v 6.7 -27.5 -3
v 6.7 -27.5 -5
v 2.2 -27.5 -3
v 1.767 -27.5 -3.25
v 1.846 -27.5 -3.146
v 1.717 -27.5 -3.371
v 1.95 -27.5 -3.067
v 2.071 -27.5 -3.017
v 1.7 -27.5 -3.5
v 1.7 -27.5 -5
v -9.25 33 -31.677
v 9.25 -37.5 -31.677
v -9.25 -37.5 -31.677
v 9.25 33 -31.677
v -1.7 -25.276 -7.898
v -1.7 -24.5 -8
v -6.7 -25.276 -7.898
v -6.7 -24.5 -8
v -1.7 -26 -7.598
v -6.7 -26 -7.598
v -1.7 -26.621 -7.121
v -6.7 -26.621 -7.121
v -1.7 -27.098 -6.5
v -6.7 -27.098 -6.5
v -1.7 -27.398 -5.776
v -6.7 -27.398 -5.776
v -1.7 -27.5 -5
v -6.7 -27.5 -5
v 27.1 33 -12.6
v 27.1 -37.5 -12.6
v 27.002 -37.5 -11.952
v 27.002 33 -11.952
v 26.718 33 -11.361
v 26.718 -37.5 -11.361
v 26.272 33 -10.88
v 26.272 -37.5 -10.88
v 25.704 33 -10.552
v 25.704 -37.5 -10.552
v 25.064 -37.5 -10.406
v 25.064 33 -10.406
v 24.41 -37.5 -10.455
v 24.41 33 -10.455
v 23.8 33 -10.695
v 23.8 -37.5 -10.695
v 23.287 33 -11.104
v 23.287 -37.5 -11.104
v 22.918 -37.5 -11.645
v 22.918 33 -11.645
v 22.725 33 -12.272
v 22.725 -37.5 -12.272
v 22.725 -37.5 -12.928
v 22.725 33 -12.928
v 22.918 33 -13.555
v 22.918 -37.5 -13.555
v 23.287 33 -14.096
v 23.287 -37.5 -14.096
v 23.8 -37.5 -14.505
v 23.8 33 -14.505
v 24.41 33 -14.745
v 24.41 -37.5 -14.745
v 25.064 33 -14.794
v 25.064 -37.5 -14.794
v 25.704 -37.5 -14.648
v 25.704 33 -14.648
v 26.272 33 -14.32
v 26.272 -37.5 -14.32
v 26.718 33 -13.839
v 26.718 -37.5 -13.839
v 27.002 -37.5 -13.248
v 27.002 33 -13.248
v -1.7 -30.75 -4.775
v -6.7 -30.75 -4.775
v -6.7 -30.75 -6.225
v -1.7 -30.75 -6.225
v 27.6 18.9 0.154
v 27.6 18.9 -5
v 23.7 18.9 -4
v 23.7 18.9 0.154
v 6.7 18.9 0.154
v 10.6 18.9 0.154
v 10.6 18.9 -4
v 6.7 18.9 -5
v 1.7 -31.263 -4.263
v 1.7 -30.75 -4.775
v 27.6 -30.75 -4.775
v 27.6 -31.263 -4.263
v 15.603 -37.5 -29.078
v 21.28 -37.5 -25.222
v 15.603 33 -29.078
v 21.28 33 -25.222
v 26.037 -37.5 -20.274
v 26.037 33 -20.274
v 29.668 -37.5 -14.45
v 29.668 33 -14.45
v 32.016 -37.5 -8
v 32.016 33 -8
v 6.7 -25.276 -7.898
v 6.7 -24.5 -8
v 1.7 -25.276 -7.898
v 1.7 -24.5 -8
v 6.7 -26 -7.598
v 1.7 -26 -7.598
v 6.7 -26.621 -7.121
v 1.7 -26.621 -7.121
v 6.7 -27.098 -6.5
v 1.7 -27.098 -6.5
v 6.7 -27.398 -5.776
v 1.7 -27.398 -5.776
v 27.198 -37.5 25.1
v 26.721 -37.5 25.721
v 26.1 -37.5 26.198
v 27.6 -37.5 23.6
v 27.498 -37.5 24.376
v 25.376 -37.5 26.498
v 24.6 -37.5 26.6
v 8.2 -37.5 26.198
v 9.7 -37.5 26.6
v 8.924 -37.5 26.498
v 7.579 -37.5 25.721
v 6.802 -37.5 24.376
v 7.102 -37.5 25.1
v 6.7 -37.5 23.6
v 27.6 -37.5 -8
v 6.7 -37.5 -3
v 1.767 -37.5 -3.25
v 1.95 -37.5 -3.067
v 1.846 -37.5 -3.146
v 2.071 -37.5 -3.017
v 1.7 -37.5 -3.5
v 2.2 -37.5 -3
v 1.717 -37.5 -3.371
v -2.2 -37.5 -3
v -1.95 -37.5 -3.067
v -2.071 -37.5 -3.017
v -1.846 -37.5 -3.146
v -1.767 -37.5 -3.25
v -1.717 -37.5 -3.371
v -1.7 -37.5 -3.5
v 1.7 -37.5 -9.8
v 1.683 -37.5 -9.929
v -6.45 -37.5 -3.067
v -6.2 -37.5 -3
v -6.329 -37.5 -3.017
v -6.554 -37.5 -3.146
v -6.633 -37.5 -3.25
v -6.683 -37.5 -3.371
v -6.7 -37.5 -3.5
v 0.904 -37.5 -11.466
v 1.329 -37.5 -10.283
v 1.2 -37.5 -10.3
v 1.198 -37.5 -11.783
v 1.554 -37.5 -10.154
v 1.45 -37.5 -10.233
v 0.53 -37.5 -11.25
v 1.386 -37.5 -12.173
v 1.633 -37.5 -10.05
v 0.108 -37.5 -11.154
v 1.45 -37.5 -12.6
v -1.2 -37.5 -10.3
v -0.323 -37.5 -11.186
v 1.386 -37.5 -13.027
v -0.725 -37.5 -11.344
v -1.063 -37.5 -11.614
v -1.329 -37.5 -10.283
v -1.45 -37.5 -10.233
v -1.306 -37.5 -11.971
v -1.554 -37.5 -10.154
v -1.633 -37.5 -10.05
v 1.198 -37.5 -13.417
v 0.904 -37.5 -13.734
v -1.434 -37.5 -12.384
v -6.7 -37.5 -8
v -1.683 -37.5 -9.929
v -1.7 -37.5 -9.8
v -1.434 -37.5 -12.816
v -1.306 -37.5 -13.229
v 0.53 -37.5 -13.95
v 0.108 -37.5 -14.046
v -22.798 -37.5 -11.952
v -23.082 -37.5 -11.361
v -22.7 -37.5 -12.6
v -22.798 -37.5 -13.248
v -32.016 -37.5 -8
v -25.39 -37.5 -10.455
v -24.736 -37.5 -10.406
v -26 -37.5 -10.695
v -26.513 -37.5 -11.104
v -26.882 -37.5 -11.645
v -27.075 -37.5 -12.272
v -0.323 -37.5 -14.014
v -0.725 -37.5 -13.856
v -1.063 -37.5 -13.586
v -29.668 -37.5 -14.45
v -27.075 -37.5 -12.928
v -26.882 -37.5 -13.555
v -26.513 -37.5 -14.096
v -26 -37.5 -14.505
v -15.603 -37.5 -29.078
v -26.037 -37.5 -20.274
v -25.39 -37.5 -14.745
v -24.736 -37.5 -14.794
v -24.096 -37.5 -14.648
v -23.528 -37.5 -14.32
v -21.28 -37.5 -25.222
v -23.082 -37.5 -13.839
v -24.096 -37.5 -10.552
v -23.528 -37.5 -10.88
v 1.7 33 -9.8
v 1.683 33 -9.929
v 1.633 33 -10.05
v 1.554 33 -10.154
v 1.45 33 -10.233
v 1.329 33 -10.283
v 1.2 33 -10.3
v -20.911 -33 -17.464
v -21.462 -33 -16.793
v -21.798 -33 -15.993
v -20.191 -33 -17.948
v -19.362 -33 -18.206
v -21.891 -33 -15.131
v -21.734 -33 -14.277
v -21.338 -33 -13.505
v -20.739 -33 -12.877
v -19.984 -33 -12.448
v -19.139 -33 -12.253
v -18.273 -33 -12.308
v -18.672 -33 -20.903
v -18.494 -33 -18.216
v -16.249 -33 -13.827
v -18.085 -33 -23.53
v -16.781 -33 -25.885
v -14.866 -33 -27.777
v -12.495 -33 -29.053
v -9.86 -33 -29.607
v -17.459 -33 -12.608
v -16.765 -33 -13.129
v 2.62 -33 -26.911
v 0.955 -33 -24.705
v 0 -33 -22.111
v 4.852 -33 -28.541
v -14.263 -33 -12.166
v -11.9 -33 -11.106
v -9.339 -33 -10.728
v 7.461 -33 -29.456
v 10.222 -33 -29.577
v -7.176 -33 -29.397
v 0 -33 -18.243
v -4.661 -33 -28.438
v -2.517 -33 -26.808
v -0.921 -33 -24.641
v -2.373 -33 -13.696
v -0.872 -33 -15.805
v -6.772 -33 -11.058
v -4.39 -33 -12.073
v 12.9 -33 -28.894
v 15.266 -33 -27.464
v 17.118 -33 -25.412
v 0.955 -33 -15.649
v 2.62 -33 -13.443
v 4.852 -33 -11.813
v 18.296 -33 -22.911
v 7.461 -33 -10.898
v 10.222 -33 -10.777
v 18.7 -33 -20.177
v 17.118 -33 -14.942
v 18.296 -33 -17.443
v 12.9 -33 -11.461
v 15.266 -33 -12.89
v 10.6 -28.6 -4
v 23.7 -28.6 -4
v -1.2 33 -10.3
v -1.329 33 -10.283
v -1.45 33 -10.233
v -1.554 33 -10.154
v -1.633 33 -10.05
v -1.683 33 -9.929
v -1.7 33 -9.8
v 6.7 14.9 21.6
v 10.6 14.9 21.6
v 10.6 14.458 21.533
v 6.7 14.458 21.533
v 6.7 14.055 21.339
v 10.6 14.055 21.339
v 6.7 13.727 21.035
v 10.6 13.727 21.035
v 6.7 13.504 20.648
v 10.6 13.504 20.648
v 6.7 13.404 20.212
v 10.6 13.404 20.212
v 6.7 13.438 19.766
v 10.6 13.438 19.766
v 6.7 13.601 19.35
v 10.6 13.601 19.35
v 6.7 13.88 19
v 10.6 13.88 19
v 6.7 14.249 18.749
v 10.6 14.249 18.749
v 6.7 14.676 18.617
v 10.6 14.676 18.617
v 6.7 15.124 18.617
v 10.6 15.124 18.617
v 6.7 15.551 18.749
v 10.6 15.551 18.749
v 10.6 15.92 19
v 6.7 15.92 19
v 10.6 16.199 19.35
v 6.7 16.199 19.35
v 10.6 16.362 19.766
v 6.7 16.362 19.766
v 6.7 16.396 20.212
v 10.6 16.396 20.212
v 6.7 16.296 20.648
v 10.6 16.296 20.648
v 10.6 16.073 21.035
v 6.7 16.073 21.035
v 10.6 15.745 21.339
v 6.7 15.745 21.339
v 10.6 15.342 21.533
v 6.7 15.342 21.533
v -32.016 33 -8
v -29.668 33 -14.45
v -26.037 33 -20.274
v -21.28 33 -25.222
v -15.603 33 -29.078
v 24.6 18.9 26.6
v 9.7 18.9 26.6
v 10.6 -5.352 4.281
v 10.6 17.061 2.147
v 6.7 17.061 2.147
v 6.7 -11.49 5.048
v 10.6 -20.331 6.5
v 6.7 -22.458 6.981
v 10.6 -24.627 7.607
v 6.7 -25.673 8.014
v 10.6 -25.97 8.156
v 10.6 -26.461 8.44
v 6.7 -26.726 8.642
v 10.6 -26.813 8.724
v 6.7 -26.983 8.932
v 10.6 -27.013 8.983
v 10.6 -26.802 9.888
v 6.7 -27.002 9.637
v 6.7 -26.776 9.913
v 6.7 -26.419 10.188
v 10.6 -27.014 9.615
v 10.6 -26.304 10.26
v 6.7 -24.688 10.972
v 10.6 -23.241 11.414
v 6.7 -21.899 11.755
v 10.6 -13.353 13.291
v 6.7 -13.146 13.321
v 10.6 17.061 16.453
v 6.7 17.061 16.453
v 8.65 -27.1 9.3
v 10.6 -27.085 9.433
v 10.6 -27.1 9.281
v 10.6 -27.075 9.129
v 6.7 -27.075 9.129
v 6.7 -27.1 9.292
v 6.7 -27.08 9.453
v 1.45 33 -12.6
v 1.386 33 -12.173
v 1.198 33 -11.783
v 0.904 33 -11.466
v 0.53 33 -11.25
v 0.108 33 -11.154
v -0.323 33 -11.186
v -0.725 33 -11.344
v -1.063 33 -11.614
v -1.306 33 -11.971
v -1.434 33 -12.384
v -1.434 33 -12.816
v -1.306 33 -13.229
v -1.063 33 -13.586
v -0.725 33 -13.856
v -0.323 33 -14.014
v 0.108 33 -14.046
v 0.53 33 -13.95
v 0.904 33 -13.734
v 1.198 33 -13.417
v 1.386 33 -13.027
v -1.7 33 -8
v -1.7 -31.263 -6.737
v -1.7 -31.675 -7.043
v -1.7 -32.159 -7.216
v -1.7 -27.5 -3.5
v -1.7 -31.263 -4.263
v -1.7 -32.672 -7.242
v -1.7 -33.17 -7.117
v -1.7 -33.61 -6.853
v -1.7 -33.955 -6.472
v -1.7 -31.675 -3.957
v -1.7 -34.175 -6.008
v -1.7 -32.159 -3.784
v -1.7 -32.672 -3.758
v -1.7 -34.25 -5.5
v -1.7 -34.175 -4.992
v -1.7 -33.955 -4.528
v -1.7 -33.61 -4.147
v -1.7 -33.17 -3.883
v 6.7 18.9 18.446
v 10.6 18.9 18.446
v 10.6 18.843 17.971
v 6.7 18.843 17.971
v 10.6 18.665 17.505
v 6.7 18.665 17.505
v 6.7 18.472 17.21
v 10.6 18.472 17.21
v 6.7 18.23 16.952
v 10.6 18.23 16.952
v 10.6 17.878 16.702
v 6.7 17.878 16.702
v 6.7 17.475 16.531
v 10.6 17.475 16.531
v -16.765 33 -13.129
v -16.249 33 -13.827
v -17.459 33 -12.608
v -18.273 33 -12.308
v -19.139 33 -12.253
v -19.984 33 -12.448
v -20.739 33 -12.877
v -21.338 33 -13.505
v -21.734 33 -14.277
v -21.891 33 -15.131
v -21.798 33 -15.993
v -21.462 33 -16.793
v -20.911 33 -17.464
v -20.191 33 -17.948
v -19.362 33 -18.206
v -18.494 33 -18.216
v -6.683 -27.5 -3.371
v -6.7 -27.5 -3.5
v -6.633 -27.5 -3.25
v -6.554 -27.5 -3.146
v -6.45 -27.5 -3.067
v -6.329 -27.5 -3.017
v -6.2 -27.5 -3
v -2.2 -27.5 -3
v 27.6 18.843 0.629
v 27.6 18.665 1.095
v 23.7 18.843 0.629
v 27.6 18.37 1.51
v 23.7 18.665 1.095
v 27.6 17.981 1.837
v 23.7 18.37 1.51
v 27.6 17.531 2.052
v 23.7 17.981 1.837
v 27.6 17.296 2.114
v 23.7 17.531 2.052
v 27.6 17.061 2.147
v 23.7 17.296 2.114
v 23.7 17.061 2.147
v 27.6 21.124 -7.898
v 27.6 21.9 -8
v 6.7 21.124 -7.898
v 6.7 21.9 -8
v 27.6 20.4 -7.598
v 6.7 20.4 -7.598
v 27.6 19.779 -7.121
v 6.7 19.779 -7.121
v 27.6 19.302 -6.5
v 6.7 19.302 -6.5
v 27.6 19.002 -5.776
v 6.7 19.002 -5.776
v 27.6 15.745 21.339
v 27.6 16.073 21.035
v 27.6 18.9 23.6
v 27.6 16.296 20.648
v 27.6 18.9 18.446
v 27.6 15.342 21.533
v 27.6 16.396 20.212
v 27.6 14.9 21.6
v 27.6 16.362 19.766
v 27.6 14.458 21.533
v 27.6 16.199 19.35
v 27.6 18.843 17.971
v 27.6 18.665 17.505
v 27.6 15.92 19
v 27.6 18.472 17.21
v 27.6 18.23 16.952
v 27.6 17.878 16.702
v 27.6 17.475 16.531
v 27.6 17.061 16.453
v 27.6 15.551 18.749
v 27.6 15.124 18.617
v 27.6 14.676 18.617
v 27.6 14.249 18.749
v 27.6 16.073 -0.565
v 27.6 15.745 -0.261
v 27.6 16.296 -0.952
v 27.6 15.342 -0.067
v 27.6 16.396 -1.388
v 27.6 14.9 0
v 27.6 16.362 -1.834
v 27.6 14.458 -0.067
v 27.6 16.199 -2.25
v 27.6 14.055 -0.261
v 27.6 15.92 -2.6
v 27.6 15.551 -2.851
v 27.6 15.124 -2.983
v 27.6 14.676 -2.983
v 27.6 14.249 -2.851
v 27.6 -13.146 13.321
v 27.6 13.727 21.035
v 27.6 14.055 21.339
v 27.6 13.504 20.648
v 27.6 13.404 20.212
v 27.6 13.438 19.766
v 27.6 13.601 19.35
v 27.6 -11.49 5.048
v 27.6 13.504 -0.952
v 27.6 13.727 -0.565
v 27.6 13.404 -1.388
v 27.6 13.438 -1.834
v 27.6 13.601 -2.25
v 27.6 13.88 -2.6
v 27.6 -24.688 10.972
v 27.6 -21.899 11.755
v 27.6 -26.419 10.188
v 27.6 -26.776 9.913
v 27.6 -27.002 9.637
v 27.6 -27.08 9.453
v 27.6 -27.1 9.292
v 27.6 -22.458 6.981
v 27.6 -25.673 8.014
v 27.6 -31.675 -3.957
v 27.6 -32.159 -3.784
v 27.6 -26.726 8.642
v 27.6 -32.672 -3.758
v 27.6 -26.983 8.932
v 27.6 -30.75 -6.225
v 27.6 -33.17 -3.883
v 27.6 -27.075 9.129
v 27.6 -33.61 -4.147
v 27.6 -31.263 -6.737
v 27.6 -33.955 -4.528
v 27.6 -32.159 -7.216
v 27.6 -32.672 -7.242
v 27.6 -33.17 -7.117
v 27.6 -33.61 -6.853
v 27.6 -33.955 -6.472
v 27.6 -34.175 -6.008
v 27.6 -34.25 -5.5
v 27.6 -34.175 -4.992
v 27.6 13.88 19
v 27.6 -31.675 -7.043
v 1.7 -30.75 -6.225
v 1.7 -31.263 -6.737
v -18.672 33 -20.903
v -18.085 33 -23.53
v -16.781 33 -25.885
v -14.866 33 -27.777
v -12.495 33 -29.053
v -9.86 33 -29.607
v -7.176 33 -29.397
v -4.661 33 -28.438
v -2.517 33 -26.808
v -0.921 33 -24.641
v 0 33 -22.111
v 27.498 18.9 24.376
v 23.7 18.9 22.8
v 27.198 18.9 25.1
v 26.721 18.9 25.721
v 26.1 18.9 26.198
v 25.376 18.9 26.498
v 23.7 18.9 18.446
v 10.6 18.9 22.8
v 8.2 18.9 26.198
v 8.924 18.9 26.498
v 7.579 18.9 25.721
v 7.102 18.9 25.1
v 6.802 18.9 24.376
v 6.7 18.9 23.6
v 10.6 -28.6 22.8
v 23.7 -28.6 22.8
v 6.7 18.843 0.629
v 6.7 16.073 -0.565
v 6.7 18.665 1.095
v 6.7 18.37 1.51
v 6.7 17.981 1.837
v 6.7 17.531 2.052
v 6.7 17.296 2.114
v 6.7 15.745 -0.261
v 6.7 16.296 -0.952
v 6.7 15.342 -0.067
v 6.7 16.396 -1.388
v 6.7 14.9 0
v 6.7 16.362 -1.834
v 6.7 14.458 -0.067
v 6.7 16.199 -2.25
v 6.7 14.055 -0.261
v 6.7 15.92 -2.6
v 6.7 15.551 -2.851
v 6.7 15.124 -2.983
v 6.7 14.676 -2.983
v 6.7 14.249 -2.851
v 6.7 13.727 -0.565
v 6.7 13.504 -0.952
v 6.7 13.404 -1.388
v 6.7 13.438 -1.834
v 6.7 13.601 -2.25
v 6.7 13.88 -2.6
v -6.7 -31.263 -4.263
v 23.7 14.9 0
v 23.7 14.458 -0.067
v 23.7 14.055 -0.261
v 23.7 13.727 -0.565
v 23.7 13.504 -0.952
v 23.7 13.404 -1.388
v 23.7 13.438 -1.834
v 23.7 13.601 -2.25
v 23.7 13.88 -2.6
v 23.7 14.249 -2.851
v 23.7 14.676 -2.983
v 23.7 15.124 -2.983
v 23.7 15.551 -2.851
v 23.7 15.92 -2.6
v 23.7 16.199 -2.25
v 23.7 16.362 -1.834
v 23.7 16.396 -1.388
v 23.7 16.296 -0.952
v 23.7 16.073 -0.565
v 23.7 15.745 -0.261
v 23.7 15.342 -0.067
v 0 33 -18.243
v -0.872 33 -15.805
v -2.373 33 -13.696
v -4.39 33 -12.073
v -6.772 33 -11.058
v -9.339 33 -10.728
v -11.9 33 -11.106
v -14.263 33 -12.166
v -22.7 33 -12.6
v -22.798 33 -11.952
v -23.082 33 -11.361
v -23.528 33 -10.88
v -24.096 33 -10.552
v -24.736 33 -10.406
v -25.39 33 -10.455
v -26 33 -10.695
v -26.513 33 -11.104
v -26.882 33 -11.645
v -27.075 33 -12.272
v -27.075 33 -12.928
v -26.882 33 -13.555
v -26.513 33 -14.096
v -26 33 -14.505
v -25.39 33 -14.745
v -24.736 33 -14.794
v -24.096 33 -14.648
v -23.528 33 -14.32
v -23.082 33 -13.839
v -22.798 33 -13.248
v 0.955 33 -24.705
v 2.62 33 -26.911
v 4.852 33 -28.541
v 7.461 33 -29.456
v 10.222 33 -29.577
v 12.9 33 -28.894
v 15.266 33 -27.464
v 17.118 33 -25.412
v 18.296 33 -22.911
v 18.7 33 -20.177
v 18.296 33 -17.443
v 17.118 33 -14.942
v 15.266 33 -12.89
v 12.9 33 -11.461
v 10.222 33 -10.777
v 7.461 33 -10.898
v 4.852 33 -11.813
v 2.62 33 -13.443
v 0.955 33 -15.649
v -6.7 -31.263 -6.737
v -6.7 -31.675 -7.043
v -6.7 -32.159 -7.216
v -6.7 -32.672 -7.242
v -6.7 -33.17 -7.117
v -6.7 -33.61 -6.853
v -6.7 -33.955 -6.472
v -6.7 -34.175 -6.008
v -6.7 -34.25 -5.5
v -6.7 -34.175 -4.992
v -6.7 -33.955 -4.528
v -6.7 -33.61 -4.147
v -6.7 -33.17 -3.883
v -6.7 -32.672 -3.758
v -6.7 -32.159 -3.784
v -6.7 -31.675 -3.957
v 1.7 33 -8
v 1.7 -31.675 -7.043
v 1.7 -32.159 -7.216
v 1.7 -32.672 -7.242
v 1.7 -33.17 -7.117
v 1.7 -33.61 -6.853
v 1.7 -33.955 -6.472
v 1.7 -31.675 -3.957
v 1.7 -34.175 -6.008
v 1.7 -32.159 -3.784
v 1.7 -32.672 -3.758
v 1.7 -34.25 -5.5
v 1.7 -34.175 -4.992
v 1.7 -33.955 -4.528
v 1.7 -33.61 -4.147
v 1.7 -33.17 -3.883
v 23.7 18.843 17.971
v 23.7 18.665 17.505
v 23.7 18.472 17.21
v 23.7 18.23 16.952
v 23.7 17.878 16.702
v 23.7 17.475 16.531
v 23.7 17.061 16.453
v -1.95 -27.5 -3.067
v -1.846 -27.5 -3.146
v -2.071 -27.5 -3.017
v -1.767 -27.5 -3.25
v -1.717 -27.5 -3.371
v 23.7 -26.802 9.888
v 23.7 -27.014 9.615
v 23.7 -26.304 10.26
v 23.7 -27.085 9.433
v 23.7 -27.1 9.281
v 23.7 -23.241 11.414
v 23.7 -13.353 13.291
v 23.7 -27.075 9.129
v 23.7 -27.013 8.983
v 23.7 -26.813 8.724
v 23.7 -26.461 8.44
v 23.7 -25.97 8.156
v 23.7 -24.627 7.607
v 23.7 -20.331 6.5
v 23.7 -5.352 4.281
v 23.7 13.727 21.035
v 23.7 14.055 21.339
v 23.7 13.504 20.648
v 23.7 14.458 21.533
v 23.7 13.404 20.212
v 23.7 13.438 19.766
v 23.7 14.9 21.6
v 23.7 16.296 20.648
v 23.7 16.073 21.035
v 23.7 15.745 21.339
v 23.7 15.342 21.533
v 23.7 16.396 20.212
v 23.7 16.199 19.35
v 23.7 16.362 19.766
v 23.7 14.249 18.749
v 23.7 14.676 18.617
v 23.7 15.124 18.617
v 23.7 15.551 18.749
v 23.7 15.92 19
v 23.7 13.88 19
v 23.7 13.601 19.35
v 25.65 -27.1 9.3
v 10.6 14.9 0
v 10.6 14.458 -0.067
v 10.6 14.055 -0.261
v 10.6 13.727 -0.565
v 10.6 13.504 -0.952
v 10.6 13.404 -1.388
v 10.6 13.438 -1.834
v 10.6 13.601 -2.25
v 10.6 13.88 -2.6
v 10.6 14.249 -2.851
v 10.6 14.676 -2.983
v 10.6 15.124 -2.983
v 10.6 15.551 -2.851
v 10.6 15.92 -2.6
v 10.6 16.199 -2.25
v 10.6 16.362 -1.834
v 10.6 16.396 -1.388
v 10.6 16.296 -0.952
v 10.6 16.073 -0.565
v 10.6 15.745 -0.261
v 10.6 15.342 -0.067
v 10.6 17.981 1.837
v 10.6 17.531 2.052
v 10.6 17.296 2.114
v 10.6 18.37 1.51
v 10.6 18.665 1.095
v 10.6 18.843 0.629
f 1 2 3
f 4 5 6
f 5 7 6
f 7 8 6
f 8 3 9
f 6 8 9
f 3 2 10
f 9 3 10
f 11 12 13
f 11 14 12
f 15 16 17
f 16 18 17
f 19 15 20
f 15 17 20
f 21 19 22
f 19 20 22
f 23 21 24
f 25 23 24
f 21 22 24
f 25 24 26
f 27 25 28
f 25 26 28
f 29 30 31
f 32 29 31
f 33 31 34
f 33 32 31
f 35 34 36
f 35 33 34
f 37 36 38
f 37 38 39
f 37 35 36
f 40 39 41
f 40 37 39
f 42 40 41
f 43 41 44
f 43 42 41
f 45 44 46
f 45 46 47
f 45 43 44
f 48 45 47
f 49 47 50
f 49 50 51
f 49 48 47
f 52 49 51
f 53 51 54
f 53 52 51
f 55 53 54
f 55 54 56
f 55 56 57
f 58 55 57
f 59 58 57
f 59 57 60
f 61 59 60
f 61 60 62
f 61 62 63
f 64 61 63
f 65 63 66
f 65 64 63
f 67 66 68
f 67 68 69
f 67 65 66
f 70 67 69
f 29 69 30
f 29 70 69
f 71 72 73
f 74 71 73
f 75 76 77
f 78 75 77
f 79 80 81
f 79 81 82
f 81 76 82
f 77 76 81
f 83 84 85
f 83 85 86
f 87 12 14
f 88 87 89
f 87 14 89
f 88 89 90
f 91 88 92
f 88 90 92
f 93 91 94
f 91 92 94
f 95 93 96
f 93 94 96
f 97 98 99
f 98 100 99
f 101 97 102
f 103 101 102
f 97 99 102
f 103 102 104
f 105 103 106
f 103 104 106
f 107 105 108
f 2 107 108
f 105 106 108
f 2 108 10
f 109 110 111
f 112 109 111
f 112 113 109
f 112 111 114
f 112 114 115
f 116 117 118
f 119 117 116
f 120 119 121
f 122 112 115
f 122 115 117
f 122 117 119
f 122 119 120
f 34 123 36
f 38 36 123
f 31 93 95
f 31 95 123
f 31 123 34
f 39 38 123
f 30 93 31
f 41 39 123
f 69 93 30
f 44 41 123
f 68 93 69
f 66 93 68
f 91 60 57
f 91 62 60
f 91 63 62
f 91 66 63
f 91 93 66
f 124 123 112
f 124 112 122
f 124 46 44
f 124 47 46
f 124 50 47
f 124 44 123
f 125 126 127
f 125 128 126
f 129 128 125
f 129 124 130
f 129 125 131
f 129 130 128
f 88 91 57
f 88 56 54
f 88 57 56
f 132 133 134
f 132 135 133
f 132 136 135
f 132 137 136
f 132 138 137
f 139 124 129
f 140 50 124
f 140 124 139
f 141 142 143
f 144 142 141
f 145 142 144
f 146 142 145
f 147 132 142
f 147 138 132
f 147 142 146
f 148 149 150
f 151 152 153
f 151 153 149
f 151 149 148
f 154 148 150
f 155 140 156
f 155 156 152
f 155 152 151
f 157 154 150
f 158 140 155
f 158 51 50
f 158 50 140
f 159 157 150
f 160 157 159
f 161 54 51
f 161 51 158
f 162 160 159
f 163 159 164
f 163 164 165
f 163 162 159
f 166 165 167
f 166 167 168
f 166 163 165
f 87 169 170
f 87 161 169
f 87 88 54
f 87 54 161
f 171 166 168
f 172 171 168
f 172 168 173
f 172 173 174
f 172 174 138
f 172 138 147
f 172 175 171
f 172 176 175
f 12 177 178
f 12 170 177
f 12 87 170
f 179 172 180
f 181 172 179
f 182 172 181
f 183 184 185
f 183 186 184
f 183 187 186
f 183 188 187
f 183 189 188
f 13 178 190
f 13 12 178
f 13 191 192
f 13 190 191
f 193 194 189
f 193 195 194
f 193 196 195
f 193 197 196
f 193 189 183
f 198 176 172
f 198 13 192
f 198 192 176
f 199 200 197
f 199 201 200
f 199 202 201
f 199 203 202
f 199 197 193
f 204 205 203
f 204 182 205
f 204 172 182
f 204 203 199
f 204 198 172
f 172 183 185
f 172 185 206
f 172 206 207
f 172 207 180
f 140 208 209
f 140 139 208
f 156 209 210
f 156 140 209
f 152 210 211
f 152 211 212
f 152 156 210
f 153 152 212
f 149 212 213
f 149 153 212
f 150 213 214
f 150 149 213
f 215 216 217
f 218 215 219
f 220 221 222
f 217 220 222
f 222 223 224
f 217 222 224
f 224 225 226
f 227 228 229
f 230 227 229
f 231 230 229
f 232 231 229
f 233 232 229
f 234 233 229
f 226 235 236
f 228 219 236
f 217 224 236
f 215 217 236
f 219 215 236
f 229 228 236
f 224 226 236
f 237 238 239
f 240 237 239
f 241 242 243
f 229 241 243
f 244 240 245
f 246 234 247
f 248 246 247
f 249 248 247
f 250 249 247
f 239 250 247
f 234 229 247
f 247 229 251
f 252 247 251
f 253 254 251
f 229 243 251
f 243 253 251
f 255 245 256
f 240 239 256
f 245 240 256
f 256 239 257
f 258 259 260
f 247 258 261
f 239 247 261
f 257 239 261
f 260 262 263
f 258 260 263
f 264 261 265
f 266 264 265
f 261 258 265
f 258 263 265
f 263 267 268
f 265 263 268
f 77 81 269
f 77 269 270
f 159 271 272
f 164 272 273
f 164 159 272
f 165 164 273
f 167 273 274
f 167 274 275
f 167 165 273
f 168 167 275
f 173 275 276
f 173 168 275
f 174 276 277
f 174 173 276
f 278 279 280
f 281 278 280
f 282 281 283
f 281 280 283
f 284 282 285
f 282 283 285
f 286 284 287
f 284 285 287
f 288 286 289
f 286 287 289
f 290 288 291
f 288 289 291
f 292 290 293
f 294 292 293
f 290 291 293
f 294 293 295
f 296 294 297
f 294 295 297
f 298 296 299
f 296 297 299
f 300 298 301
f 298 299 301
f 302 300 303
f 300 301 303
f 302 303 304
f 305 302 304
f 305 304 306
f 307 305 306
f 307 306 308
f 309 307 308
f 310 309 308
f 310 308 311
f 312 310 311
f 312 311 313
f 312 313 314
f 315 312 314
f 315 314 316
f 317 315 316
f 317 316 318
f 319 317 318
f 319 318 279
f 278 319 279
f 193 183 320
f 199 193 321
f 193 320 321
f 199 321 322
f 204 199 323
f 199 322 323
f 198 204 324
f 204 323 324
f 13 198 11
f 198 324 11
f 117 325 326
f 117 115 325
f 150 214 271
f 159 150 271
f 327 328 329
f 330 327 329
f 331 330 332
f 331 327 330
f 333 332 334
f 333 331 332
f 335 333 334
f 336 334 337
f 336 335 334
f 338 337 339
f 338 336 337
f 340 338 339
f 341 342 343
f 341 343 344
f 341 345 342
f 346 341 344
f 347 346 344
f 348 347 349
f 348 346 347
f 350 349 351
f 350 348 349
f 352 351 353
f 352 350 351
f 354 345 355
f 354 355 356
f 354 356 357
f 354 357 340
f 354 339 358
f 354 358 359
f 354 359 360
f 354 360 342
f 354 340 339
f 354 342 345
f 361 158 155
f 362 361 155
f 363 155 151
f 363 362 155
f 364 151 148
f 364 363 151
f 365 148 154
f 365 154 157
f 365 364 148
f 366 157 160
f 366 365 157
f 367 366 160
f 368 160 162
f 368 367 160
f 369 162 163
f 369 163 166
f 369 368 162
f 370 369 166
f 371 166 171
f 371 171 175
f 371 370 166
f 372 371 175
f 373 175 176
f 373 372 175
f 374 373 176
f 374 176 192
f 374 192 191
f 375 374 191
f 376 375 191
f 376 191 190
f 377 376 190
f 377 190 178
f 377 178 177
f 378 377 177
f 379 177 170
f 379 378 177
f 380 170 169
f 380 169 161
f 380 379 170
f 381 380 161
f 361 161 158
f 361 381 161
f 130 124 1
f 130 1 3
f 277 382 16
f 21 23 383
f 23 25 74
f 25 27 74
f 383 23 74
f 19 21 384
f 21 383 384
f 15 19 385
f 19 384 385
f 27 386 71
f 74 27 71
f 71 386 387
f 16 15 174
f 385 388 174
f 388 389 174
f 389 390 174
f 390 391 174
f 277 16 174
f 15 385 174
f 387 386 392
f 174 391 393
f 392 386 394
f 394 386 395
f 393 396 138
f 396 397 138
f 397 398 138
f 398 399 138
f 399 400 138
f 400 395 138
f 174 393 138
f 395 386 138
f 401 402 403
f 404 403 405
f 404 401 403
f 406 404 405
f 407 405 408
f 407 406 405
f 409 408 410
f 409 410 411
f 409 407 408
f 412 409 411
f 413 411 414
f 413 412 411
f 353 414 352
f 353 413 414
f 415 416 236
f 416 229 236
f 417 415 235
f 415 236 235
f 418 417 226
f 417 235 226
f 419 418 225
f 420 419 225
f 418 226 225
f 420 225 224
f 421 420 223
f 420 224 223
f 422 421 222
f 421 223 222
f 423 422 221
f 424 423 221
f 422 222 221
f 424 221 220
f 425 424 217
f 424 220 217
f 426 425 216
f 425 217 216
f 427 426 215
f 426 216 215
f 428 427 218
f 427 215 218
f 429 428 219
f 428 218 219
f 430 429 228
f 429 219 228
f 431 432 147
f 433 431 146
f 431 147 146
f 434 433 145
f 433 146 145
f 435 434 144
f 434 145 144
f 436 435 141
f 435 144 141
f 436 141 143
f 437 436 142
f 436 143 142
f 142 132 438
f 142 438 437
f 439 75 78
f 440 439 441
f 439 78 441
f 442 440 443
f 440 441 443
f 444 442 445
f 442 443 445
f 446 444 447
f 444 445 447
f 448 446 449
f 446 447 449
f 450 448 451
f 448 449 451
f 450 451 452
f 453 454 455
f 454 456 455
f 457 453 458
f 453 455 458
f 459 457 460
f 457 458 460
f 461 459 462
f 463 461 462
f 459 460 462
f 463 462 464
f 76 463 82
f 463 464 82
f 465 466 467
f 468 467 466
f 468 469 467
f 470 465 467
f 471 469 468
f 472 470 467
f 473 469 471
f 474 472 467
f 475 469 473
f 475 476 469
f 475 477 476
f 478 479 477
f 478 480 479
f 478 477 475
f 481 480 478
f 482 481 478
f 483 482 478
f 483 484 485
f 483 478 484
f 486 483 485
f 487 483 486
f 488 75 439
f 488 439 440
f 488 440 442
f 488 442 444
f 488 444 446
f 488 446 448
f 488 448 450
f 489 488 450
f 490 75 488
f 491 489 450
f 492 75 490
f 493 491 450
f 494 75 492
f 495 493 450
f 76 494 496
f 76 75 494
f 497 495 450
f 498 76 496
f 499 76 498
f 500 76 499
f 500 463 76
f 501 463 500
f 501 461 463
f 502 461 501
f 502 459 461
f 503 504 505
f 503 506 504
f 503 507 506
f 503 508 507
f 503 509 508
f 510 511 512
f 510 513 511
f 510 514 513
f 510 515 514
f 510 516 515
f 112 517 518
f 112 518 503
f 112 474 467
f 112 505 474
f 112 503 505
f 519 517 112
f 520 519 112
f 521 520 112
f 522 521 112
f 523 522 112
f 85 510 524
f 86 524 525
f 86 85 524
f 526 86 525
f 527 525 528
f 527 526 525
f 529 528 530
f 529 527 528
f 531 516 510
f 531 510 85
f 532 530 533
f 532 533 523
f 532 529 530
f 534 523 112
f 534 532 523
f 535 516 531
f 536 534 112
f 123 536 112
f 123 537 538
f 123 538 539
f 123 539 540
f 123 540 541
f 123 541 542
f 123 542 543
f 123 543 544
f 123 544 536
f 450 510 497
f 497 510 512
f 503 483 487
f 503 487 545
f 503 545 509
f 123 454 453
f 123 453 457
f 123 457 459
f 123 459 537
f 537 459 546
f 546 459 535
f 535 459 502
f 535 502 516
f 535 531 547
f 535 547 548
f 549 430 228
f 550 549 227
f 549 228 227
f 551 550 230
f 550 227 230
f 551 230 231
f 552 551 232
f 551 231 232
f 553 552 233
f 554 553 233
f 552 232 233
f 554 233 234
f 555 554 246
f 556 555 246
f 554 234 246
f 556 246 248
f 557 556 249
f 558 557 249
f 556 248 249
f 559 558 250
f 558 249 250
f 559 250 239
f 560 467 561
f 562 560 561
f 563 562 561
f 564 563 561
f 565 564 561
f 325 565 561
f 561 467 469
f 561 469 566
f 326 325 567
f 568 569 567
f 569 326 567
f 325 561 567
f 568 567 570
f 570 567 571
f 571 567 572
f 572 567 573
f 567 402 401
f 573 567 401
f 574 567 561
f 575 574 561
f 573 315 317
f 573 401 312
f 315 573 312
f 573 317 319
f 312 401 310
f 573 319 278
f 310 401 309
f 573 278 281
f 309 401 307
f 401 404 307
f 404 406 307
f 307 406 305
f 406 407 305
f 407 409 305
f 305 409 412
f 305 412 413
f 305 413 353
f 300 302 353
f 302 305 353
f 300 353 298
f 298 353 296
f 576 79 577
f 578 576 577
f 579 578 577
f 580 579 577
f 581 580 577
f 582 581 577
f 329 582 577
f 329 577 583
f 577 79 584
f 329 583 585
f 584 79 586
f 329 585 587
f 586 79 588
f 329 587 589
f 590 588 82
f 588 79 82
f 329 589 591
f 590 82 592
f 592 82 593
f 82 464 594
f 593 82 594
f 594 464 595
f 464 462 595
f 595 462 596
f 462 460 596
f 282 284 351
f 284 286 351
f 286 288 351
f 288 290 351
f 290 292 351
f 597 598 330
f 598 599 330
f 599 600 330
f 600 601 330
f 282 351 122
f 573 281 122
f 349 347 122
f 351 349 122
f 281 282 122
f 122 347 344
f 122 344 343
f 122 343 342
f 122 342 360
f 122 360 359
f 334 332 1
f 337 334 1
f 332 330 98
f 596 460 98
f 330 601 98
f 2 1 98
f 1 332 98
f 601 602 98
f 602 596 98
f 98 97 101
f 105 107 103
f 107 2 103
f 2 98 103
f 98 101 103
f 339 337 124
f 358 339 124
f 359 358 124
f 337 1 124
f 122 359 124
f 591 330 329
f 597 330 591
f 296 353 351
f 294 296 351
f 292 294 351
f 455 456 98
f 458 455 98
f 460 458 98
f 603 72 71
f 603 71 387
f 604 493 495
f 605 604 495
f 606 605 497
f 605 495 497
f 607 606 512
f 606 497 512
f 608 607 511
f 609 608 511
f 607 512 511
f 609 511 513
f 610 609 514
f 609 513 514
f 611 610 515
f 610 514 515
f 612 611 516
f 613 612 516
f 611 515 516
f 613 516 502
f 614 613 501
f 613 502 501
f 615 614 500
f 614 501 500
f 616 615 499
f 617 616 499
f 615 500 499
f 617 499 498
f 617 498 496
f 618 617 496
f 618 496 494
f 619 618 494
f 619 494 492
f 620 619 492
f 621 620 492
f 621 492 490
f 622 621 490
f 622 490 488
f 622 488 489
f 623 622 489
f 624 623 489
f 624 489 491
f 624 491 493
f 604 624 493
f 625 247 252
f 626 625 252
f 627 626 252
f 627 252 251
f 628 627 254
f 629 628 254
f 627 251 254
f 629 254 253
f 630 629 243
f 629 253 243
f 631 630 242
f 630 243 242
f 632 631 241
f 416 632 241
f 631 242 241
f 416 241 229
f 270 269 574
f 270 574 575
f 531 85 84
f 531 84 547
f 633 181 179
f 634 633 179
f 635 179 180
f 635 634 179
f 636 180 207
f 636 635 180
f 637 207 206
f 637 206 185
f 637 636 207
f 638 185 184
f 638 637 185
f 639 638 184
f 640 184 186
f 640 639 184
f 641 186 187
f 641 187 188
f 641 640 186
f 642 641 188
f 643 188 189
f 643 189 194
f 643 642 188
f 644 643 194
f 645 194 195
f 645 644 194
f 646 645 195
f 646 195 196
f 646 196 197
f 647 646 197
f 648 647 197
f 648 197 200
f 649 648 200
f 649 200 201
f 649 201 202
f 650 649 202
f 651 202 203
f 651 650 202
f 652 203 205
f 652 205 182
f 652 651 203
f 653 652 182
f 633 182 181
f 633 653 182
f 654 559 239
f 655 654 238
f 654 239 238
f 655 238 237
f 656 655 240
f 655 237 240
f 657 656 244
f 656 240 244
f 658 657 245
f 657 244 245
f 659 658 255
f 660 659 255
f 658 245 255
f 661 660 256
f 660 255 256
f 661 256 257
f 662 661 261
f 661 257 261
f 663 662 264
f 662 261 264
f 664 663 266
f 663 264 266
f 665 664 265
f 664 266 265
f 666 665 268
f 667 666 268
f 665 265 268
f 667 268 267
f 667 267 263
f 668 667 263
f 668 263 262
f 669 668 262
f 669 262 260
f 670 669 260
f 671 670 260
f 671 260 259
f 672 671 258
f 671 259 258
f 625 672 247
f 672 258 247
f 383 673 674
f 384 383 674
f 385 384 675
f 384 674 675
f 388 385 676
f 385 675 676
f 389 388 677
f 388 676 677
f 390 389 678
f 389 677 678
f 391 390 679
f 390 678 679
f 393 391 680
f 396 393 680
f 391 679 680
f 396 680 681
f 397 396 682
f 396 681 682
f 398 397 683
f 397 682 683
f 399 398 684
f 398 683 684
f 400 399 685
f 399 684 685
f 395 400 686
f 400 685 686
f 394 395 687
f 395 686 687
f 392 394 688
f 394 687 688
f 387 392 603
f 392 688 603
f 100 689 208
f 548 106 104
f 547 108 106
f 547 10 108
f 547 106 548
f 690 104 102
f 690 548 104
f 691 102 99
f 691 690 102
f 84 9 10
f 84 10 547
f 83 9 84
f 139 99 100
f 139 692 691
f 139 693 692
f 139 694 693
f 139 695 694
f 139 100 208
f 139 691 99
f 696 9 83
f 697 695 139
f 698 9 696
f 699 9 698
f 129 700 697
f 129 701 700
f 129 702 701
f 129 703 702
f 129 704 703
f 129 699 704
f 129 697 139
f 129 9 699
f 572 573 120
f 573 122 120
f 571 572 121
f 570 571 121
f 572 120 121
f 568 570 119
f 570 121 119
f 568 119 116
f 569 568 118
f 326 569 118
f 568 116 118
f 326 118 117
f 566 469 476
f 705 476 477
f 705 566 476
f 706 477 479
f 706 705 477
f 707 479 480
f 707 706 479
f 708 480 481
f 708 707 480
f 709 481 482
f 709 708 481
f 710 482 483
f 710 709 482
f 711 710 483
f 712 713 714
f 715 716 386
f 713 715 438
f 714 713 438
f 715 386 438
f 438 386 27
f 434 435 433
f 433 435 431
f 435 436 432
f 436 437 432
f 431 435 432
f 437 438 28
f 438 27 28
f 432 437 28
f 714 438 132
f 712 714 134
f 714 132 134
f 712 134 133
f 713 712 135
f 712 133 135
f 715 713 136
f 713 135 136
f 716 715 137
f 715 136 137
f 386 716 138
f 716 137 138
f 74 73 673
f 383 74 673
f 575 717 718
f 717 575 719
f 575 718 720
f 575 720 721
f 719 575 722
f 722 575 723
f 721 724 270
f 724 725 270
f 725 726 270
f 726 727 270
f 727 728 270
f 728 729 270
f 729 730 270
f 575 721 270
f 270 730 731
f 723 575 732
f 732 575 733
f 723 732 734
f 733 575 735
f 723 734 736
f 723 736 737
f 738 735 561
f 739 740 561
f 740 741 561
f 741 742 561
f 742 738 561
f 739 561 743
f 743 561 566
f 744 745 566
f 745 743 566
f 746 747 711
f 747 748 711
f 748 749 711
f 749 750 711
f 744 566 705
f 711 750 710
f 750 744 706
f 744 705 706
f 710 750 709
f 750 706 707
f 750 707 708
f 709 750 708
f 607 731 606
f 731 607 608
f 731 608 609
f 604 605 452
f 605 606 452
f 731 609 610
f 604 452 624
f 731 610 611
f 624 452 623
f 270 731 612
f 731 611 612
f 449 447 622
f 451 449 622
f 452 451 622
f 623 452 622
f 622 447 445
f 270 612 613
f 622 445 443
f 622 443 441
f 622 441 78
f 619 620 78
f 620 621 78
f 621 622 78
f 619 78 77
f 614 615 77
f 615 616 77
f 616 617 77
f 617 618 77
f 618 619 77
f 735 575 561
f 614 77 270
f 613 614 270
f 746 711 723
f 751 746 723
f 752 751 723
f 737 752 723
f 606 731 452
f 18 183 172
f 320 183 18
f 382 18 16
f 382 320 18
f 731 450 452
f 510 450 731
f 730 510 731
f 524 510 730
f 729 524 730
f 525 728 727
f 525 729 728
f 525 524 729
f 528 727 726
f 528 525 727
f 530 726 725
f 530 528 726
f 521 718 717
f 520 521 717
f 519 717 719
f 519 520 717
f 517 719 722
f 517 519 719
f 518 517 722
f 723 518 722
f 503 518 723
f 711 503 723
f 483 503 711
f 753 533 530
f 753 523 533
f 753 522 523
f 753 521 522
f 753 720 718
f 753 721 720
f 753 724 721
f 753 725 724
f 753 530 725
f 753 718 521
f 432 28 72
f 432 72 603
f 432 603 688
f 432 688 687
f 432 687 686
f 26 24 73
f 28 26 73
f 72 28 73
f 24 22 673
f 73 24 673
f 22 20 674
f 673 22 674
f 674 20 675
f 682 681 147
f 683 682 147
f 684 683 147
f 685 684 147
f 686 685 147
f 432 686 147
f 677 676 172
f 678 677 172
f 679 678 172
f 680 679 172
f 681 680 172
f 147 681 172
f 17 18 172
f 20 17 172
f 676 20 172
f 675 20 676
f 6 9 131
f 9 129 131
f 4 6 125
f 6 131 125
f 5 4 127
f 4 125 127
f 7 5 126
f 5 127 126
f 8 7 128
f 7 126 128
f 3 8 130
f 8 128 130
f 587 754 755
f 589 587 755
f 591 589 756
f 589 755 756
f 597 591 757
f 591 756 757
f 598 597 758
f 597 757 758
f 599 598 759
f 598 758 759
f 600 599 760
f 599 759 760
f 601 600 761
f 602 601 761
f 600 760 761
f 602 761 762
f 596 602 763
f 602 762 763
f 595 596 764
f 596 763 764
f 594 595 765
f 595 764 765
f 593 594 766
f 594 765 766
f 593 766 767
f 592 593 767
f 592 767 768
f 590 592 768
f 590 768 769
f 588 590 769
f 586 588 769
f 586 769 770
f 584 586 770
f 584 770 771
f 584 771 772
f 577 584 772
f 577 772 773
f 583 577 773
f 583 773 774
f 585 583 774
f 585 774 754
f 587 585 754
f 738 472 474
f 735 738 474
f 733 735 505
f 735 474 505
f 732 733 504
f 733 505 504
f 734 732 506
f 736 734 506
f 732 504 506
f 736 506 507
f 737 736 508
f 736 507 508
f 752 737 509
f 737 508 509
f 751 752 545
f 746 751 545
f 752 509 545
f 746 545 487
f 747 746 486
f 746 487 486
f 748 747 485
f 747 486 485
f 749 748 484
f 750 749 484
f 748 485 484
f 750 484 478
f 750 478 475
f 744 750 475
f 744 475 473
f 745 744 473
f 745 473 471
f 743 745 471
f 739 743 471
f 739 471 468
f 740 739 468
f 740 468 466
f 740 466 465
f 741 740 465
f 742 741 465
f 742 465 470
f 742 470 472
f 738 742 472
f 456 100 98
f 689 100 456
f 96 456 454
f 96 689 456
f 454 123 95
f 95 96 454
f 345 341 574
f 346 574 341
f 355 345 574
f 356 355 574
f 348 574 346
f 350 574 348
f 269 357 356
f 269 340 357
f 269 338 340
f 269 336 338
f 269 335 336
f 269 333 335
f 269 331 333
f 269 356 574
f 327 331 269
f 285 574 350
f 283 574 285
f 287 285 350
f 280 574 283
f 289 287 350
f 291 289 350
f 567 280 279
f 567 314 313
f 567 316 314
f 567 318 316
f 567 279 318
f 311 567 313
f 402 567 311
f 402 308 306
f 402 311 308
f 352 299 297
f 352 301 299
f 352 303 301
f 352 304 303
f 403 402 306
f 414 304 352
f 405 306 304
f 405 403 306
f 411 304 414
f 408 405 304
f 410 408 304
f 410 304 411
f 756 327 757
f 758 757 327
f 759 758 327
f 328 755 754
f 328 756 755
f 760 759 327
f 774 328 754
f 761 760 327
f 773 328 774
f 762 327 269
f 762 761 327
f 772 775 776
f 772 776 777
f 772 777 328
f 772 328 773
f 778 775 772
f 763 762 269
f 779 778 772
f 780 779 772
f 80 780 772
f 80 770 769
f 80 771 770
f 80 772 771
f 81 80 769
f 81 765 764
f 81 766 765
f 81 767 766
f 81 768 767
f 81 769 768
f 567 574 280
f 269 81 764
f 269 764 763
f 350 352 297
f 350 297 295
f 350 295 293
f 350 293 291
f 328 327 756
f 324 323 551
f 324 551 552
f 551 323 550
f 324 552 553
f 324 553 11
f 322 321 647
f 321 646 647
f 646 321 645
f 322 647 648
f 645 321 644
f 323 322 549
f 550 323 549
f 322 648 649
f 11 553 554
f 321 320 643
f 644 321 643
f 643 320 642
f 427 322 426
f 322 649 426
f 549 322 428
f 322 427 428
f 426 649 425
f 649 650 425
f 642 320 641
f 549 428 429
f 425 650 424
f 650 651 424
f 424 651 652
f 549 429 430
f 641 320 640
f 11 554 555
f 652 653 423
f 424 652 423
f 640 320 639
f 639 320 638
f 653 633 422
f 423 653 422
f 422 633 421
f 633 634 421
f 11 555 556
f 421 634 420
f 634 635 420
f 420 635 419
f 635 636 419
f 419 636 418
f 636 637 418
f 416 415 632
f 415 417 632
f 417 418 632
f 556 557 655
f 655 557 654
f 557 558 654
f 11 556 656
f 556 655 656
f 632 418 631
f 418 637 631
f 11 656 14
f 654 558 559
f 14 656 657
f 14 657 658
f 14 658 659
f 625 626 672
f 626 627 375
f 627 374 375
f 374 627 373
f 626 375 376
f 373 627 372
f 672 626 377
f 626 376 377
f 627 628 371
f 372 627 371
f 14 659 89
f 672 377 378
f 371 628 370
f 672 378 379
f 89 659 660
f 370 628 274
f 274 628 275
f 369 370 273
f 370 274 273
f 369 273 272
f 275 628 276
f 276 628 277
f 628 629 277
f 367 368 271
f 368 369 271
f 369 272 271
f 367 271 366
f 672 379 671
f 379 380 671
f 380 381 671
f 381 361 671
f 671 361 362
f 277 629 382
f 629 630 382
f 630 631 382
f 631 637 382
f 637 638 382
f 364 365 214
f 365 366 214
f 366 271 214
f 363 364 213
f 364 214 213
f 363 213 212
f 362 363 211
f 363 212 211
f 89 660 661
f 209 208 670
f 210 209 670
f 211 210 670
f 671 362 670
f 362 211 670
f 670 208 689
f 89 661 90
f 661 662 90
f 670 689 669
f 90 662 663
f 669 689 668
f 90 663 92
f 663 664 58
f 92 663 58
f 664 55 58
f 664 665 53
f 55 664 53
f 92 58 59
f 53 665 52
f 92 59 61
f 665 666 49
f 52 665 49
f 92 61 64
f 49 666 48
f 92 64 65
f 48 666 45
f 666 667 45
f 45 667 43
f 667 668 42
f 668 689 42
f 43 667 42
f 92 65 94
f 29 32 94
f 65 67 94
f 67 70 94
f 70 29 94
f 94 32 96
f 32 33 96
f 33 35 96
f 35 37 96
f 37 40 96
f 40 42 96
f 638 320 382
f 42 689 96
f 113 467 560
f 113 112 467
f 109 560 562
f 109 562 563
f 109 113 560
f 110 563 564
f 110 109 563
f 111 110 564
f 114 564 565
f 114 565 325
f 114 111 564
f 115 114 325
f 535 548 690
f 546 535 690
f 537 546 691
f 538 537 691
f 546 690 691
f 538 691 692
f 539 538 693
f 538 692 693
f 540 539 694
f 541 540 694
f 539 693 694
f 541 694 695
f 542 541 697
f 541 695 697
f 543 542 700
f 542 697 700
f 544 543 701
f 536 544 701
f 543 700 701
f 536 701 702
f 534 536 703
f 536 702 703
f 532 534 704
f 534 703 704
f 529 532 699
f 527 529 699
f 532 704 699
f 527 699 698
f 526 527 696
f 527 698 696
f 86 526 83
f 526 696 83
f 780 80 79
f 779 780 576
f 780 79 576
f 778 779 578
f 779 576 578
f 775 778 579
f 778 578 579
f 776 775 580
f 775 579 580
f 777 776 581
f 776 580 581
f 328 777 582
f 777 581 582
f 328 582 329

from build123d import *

# Parameters (mm, degrees)
SKETCH_R        = 2.2
SKETCH_R_2      = 1.45
PAD_DEPTH       = 33
SKETCH037_R     = 2.2
SKETCH037_R_2   = 1.45
PAD016_DEPTH    = 4.5
SKETCH039_W     = 13.4
SKETCH039_H     = 10
PAD017_DEPTH    = 5
SKETCH045_W     = 20.9
SKETCH045_H     = 56.4
PAD018_DEPTH    = 34.6
POCKET022_DEPTH = 38.716621
SKETCH046_W     = 13.1
SKETCH046_H     = 26.8
POCKET023_DEPTH = 47.5
SKETCH047_R     = 1.5
POCKET024_DEPTH = 20.9
SKETCH041_W     = 3.4
SKETCH041_H     = 70.5
POCKET025_DEPTH = 7.3
FILLET006_R     = 0.5
FILLET007_R     = 3
FILLET008_R     = 3
FILLET009_R     = 2
FILLET010_R     = 3
FILLET011_R     = 0.5


with BuildPart() as part:
    # Sketch → Pad (new body, symmetric)
    with BuildSketch(Plane.XZ):
        with BuildLine():
            Line((-9.25, -31.677082), (9.25, -31.677082))
            ThreePointArc((9.25, -31.677082), (23.787894, -22.872168), (32.015621, -8))
            Line((-32.015621, -8), (32.015621, -8))
            ThreePointArc((-32.015621, -8), (-23.787894, -22.872168), (-9.25, -31.677082))
        make_face()
        with Locations((24.9, -12.6)):
            Circle(SKETCH_R, mode=Mode.SUBTRACT)
        with Locations((-24.9, -12.6)):
            Circle(SKETCH_R, mode=Mode.SUBTRACT)
        with Locations((0, -12.6)):
            Circle(SKETCH_R_2, mode=Mode.SUBTRACT)
        with BuildLine():
            ThreePointArc((0, -18.243174), (-6.771568, -11.057878), (-16.248592, -13.827105))
            ThreePointArc((-16.248592, -13.827105), (-21.564175, -13.876493), (-18.494342, -18.216307))
            ThreePointArc((-18.494342, -18.216307), (-11.197344, -29.424262), (0, -22.11099))
            ThreePointArc((0, -22.11099), (18.7, -20.177082), (0, -18.243174))
        make_face(mode=Mode.SUBTRACT)
    extrude(amount=PAD_DEPTH, both=True)

    # Sketch037 → Pad016 (join)
    with BuildSketch(Plane.XZ.offset(33)):
        with BuildLine():
            ThreePointArc((-32.015621, -8), (-23.787894, -22.872168), (-9.25, -31.677082))
            Line((9.25, -31.677082), (-9.25, -31.677082))
            ThreePointArc((9.25, -31.677082), (23.787894, -22.872168), (32.015621, -8))
            Line((-32.015621, -8), (32.015621, -8))
        make_face()
        with Locations((-24.9, -12.6)):
            Circle(SKETCH037_R, mode=Mode.SUBTRACT)
        with Locations((0, -12.6)):
            Circle(SKETCH037_R_2, mode=Mode.SUBTRACT)
        with Locations((24.9, -12.6)):
            Circle(SKETCH037_R, mode=Mode.SUBTRACT)
    extrude(amount=PAD016_DEPTH)

    # Sketch039 (on Face2 of Pad016) → Pad017 (join)
    with BuildSketch(Plane(origin=(0, 0, -8), x_dir=(-1, 0, 0), z_dir=(0, 0, 1))):
        with Locations((0, 32.5)):
            Rectangle(SKETCH039_W, SKETCH039_H)
    extrude(amount=PAD017_DEPTH)

    # Sketch045 (on Face2 of Pad017) → Pad018 (join)
    with BuildSketch(Plane(origin=(0, 0, -8), x_dir=(-1, 0, 0), z_dir=(0, 0, 1))):
        with Locations((-17.15, 9.3)):
            Rectangle(SKETCH045_W, SKETCH045_H)
    extrude(amount=PAD018_DEPTH)

    # Sketch040 (on Face12 of Pad018) → Pocket022 (cut, through all)
    with BuildSketch(Plane(origin=(-6.7, 0, -11), x_dir=(0, 0, -1), z_dir=(-1, 0, 0))):
        with BuildLine():
            Line((-6.224875, 30.75), (-4.775126, 30.75))
            Line((-4.775126, 30.75), (-4.262563, 31.262563))
            ThreePointArc((-4.262563, 31.262563), (-5.5, 34.25), (-6.737437, 31.262563))
            Line((-6.224875, 30.75), (-6.737437, 31.262563))
        make_face()
    extrude(amount=-POCKET022_DEPTH, mode=Mode.SUBTRACT)

    # Sketch046 (on Face9 of Pocket022) → Pocket023 (cut)
    with BuildSketch(Plane(origin=(0, 18.9, 0), x_dir=(1, 0, 0), z_dir=(0, 1, 0))):
        with Locations((17.15, -9.4)):
            Rectangle(SKETCH046_W, SKETCH046_H)
    extrude(amount=-POCKET023_DEPTH, mode=Mode.SUBTRACT)

    # Sketch047 (on Face8 of Pocket023) → Pocket024 (cut)
    with BuildSketch(Plane(origin=(27.6, 0, 0), x_dir=(0, 0, 1), z_dir=(1, 0, 0))):
        with BuildLine():
            add(Edge.make_bspline(
                [(2, -18.9), (9.3, 73.1), (16.6, -18.9)],
                knots=[-7.3, -7.3, -7.3, 7.3, 7.3, 7.3], degree=2))
            Line((16.6, -18.9), (2, -18.9))
        make_face()
        with Locations((-1.5, -14.9)):
            Circle(SKETCH047_R)
        with Locations((20.1, -14.9)):
            Circle(SKETCH047_R)
    extrude(amount=-POCKET024_DEPTH, mode=Mode.SUBTRACT)

    # Sketch041 (on Face38 of Pocket024) → Pocket025 (cut)
    with BuildSketch(Plane(origin=(0, 0, -3), x_dir=(-1, 0, 0), z_dir=(0, 0, 1))):
        with Locations((0, 2.25)):
            Rectangle(SKETCH041_W, SKETCH041_H)
    extrude(amount=-POCKET025_DEPTH, mode=Mode.SUBTRACT)

    # Fillet006
    fillet006_edges = [part.edges().sort_by_distance(p)[0] for p in [
        (-6.7, -32.5, -3),
        (1.7, -32.5, -3),
        (-1.7, -32.5, -3),
    ]]
    fillet(fillet006_edges, radius=FILLET006_R)

    # Fillet007
    fillet007_edges = [part.edges().sort_by_distance(p)[0] for p in [
        (-4.2, -27.5, -8),
        (4.2, -27.5, -8),
    ]]
    fillet(fillet007_edges, radius=FILLET007_R)

    # Fillet008
    fillet008_edges = [part.edges().sort_by_distance(p)[0] for p in [
        (27.6, -9.3, 26.6),
        (6.7, -9.3, 26.6),
    ]]
    fillet(fillet008_edges, radius=FILLET008_R)

    # Fillet009
    fillet009_edges = [part.edges().sort_by_distance(p)[0] for p in [
        (8.65, 18.9, 2),
        (25.65, 18.9, 2),
        (25.65, 18.9, 16.6),
        (8.65, 18.9, 16.6),
    ]]
    fillet(fillet009_edges, radius=FILLET009_R)

    # Fillet010
    fillet010_edges = [part.edges().sort_by_distance(p)[0] for p in [
        (17.15, 18.9, -8),
    ]]
    fillet(fillet010_edges, radius=FILLET010_R)

    # Fillet011
    fillet011_edges = [part.edges().sort_by_distance(p)[0] for p in [
        (1.7, -2.25, -10.3),
        (-1.7, -2.25, -10.3),
    ]]
    fillet(fillet011_edges, radius=FILLET011_R)


solid = part.part
